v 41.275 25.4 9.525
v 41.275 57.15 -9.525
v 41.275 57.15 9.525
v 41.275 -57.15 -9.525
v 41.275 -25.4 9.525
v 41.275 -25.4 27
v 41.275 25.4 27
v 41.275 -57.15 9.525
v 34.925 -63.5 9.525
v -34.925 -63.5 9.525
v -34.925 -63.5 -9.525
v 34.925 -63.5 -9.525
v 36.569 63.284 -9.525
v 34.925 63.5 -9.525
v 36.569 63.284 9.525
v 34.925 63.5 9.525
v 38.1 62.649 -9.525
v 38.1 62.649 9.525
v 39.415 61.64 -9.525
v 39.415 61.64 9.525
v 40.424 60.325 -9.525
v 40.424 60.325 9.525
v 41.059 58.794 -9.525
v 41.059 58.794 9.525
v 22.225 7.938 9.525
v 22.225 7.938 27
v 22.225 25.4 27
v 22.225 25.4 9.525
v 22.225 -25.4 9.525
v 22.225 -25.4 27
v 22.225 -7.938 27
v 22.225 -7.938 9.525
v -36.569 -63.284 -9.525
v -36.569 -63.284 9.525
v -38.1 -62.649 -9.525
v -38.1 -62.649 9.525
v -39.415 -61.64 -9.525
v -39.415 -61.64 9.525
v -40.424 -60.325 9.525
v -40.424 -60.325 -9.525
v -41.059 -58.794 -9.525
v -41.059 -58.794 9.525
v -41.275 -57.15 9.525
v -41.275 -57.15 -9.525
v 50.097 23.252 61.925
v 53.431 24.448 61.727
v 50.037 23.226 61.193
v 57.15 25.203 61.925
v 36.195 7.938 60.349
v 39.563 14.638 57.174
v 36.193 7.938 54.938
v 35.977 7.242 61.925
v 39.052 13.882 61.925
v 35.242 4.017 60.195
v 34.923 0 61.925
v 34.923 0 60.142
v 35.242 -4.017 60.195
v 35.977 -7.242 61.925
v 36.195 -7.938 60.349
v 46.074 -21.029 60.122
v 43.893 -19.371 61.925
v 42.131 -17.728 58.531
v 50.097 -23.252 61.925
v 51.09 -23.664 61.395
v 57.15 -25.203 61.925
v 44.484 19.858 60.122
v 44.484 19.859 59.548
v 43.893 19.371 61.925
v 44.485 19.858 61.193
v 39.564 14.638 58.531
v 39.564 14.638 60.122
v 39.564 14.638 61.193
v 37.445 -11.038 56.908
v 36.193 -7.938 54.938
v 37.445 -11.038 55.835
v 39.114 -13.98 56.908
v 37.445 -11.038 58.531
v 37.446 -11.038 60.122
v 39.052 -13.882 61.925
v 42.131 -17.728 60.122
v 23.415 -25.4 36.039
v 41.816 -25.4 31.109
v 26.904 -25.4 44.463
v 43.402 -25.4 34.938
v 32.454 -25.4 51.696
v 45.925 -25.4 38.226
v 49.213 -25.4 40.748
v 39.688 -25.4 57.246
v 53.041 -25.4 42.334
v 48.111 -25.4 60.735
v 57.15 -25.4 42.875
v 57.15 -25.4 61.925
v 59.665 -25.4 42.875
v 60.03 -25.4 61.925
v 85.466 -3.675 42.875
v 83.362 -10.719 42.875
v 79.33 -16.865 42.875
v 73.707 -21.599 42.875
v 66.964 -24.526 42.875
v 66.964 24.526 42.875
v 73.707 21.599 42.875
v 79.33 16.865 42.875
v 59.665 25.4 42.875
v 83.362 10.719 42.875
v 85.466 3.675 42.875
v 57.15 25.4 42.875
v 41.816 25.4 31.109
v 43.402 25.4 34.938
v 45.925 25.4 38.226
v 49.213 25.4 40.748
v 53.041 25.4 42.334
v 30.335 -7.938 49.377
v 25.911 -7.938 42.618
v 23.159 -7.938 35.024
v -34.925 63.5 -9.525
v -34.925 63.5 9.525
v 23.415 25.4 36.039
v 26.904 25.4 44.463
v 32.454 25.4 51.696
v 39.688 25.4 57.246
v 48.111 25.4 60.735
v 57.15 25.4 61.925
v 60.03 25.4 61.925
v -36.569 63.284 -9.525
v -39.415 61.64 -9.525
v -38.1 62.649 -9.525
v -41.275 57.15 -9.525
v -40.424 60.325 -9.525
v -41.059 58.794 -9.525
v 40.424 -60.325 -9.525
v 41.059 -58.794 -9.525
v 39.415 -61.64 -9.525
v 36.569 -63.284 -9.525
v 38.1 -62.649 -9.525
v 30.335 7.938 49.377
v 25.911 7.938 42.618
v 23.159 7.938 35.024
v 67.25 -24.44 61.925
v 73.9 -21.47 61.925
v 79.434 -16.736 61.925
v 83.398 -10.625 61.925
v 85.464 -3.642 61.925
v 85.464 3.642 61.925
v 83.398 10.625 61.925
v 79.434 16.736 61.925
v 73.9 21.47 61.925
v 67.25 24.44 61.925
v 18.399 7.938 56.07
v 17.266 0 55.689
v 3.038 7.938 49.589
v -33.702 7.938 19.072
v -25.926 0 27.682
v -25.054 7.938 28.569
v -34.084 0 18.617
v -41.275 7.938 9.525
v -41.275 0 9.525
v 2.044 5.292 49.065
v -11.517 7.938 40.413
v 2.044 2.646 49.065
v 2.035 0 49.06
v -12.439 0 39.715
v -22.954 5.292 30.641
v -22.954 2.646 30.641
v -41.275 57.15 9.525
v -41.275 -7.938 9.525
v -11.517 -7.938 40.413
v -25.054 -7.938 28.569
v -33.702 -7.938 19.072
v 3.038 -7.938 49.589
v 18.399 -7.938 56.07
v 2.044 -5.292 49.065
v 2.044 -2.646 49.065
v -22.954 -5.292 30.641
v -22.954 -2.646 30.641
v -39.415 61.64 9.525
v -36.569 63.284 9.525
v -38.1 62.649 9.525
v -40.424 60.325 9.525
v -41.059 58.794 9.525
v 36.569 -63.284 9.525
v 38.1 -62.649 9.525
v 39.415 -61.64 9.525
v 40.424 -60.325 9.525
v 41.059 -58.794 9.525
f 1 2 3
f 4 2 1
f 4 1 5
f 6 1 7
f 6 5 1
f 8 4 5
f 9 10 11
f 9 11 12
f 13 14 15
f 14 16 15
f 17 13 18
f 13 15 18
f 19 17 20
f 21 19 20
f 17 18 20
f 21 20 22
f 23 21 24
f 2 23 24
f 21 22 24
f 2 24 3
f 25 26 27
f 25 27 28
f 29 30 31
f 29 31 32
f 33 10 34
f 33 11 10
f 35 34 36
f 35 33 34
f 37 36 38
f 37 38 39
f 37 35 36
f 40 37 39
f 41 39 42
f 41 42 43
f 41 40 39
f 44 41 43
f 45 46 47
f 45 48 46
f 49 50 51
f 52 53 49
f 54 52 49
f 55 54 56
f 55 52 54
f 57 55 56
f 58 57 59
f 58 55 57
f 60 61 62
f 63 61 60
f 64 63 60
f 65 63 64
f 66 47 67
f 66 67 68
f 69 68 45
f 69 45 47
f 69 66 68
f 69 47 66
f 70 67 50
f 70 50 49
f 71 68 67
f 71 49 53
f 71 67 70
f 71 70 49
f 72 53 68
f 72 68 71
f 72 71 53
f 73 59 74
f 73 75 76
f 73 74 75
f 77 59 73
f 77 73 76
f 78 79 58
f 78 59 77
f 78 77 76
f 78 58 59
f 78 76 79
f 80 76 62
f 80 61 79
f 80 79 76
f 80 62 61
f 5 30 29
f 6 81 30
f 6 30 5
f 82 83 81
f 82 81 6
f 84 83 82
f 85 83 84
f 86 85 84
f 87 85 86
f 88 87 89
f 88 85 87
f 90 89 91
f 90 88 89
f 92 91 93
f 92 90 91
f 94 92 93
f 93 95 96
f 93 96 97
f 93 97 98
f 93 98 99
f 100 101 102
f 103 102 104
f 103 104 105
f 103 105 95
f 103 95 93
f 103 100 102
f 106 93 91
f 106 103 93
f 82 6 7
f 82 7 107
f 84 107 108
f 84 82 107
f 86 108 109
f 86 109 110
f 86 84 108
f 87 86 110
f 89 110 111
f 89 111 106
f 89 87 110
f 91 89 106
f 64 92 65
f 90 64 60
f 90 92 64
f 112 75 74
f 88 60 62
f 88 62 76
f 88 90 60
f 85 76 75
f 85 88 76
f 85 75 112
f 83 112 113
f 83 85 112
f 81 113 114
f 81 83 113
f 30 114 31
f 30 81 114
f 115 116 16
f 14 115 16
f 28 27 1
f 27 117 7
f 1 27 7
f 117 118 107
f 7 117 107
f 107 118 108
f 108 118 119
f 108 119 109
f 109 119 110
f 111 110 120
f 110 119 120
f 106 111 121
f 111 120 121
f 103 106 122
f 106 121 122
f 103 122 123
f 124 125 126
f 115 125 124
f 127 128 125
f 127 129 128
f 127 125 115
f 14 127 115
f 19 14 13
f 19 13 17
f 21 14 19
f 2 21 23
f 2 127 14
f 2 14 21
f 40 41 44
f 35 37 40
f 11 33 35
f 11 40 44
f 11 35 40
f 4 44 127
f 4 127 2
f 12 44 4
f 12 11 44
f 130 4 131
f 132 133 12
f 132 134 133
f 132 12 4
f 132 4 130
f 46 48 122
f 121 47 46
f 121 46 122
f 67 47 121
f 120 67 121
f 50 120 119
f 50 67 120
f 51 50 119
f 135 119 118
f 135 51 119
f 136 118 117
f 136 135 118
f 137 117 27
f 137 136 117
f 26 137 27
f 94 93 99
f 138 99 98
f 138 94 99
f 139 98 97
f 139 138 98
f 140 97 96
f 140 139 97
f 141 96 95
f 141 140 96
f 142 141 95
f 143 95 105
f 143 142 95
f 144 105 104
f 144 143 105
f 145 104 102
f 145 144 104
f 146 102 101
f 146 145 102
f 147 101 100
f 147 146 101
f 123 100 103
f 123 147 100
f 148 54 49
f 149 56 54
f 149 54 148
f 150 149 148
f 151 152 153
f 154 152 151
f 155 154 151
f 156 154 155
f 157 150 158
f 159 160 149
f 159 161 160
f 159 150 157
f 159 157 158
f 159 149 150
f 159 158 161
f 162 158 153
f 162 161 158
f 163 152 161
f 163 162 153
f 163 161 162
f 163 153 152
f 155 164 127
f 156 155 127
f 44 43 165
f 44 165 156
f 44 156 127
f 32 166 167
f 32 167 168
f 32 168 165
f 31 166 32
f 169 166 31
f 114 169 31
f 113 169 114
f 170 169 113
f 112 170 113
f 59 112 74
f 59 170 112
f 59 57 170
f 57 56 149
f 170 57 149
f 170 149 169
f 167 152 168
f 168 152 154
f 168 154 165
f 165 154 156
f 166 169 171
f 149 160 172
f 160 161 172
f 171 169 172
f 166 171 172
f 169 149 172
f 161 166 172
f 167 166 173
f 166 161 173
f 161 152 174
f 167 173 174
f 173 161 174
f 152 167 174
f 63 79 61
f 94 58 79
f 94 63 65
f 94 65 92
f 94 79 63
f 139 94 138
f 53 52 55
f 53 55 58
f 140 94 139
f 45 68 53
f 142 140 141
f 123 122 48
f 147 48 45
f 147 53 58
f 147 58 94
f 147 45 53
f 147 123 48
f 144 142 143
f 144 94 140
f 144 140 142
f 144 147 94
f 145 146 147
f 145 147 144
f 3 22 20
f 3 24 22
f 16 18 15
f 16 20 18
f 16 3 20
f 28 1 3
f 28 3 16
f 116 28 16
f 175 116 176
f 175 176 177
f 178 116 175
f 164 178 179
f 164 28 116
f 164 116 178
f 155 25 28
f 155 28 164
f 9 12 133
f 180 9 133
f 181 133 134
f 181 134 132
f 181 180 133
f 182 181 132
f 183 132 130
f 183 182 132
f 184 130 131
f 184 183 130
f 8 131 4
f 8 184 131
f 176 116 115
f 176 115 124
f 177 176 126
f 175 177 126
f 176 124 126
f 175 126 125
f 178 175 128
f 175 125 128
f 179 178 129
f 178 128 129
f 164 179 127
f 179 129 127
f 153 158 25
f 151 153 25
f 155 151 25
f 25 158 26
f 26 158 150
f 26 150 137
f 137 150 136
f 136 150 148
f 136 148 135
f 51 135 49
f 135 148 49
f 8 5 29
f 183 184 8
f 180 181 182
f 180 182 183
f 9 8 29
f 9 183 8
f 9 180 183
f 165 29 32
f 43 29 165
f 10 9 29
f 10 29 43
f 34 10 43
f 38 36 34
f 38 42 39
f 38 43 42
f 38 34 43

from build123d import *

# Parameters (mm, degrees)
F1_DEPTH = 63.5
F2_DEPTH = 25.4
F3_DEPTH = 7.9375
F5_R     = 6.35


with BuildPart() as f1:
    # F0 (on Front) → F1 (new body, symmetric)
    with BuildSketch(Plane.XZ):
        Polygon((41.275, -9.525), (41.275, 9.525), (22.225, 9.525), (-41.275, 9.525), (-41.275, -9.525), align=None)
    extrude(amount=F1_DEPTH, both=True)

    # F0 (on Front) → F2 (join, symmetric)
    with BuildSketch(Plane.XZ):
        with BuildLine():
            Line((22.225, 9.525), (41.275, 9.525))
            Line((41.275, 9.525), (41.275, 27.0002))
            ThreePointArc((41.275, 27.0002), (45.9246798487, 38.2255201513), (57.15, 42.8752))
            Line((57.15, 42.8752), (60.325, 42.8752))
            Line((60.325, 42.8752), (60.325, 61.9252))
            Line((60.325, 61.9252), (57.15, 61.9252))
            ThreePointArc((57.15, 61.9252), (32.4542956671, 51.6959043329), (22.225, 27.0002))
            Line((22.225, 27.0002), (22.225, 9.525))
        make_face()
    extrude(amount=F2_DEPTH, both=True)

    # F0 (on Front) → F3 (join, symmetric)
    with BuildSketch(Plane.XZ):
        with BuildLine():
            Line((-41.275, 9.525), (22.225, 9.525))
            Line((22.225, 9.525), (22.225, 27.0002))
            ThreePointArc((22.225, 27.0002), (32.4542956671, 51.6959043329), (57.15, 61.9252))
            add(Edge.make_bspline(
                [(57.15, 61.9252), (4.0777479298, 61.9457326829), (-22.87033014, 33.9522510767), (-41.275, 9.525)],
                knots=[0, 0, 0, 0, 111.5045361635, 111.5045361635, 111.5045361635, 111.5045361635], degree=3))
        make_face()
    extrude(amount=F3_DEPTH, both=True)

    # F0 (on Front) → F4 (revolve)
    with BuildSketch(Plane.XZ):
        Polygon((60.325, 61.9252), (60.325, 42.8752), (85.7335714616, 42.8752), (85.7267106332, 61.9252), align=None)
    revolve(axis=Axis((60.325, 0, 52.3875), (0, 0, 1)))

    # F5
    f5_edges = [f1.edges().sort_by_distance(p)[0] for p in [
        (41.275, -63.5, 0),
        (-41.275, -63.5, 0),
        (-41.275, 63.5, 0),
        (41.275, 63.5, 0),
    ]]
    fillet(f5_edges, radius=F5_R)


solid = f1.part
